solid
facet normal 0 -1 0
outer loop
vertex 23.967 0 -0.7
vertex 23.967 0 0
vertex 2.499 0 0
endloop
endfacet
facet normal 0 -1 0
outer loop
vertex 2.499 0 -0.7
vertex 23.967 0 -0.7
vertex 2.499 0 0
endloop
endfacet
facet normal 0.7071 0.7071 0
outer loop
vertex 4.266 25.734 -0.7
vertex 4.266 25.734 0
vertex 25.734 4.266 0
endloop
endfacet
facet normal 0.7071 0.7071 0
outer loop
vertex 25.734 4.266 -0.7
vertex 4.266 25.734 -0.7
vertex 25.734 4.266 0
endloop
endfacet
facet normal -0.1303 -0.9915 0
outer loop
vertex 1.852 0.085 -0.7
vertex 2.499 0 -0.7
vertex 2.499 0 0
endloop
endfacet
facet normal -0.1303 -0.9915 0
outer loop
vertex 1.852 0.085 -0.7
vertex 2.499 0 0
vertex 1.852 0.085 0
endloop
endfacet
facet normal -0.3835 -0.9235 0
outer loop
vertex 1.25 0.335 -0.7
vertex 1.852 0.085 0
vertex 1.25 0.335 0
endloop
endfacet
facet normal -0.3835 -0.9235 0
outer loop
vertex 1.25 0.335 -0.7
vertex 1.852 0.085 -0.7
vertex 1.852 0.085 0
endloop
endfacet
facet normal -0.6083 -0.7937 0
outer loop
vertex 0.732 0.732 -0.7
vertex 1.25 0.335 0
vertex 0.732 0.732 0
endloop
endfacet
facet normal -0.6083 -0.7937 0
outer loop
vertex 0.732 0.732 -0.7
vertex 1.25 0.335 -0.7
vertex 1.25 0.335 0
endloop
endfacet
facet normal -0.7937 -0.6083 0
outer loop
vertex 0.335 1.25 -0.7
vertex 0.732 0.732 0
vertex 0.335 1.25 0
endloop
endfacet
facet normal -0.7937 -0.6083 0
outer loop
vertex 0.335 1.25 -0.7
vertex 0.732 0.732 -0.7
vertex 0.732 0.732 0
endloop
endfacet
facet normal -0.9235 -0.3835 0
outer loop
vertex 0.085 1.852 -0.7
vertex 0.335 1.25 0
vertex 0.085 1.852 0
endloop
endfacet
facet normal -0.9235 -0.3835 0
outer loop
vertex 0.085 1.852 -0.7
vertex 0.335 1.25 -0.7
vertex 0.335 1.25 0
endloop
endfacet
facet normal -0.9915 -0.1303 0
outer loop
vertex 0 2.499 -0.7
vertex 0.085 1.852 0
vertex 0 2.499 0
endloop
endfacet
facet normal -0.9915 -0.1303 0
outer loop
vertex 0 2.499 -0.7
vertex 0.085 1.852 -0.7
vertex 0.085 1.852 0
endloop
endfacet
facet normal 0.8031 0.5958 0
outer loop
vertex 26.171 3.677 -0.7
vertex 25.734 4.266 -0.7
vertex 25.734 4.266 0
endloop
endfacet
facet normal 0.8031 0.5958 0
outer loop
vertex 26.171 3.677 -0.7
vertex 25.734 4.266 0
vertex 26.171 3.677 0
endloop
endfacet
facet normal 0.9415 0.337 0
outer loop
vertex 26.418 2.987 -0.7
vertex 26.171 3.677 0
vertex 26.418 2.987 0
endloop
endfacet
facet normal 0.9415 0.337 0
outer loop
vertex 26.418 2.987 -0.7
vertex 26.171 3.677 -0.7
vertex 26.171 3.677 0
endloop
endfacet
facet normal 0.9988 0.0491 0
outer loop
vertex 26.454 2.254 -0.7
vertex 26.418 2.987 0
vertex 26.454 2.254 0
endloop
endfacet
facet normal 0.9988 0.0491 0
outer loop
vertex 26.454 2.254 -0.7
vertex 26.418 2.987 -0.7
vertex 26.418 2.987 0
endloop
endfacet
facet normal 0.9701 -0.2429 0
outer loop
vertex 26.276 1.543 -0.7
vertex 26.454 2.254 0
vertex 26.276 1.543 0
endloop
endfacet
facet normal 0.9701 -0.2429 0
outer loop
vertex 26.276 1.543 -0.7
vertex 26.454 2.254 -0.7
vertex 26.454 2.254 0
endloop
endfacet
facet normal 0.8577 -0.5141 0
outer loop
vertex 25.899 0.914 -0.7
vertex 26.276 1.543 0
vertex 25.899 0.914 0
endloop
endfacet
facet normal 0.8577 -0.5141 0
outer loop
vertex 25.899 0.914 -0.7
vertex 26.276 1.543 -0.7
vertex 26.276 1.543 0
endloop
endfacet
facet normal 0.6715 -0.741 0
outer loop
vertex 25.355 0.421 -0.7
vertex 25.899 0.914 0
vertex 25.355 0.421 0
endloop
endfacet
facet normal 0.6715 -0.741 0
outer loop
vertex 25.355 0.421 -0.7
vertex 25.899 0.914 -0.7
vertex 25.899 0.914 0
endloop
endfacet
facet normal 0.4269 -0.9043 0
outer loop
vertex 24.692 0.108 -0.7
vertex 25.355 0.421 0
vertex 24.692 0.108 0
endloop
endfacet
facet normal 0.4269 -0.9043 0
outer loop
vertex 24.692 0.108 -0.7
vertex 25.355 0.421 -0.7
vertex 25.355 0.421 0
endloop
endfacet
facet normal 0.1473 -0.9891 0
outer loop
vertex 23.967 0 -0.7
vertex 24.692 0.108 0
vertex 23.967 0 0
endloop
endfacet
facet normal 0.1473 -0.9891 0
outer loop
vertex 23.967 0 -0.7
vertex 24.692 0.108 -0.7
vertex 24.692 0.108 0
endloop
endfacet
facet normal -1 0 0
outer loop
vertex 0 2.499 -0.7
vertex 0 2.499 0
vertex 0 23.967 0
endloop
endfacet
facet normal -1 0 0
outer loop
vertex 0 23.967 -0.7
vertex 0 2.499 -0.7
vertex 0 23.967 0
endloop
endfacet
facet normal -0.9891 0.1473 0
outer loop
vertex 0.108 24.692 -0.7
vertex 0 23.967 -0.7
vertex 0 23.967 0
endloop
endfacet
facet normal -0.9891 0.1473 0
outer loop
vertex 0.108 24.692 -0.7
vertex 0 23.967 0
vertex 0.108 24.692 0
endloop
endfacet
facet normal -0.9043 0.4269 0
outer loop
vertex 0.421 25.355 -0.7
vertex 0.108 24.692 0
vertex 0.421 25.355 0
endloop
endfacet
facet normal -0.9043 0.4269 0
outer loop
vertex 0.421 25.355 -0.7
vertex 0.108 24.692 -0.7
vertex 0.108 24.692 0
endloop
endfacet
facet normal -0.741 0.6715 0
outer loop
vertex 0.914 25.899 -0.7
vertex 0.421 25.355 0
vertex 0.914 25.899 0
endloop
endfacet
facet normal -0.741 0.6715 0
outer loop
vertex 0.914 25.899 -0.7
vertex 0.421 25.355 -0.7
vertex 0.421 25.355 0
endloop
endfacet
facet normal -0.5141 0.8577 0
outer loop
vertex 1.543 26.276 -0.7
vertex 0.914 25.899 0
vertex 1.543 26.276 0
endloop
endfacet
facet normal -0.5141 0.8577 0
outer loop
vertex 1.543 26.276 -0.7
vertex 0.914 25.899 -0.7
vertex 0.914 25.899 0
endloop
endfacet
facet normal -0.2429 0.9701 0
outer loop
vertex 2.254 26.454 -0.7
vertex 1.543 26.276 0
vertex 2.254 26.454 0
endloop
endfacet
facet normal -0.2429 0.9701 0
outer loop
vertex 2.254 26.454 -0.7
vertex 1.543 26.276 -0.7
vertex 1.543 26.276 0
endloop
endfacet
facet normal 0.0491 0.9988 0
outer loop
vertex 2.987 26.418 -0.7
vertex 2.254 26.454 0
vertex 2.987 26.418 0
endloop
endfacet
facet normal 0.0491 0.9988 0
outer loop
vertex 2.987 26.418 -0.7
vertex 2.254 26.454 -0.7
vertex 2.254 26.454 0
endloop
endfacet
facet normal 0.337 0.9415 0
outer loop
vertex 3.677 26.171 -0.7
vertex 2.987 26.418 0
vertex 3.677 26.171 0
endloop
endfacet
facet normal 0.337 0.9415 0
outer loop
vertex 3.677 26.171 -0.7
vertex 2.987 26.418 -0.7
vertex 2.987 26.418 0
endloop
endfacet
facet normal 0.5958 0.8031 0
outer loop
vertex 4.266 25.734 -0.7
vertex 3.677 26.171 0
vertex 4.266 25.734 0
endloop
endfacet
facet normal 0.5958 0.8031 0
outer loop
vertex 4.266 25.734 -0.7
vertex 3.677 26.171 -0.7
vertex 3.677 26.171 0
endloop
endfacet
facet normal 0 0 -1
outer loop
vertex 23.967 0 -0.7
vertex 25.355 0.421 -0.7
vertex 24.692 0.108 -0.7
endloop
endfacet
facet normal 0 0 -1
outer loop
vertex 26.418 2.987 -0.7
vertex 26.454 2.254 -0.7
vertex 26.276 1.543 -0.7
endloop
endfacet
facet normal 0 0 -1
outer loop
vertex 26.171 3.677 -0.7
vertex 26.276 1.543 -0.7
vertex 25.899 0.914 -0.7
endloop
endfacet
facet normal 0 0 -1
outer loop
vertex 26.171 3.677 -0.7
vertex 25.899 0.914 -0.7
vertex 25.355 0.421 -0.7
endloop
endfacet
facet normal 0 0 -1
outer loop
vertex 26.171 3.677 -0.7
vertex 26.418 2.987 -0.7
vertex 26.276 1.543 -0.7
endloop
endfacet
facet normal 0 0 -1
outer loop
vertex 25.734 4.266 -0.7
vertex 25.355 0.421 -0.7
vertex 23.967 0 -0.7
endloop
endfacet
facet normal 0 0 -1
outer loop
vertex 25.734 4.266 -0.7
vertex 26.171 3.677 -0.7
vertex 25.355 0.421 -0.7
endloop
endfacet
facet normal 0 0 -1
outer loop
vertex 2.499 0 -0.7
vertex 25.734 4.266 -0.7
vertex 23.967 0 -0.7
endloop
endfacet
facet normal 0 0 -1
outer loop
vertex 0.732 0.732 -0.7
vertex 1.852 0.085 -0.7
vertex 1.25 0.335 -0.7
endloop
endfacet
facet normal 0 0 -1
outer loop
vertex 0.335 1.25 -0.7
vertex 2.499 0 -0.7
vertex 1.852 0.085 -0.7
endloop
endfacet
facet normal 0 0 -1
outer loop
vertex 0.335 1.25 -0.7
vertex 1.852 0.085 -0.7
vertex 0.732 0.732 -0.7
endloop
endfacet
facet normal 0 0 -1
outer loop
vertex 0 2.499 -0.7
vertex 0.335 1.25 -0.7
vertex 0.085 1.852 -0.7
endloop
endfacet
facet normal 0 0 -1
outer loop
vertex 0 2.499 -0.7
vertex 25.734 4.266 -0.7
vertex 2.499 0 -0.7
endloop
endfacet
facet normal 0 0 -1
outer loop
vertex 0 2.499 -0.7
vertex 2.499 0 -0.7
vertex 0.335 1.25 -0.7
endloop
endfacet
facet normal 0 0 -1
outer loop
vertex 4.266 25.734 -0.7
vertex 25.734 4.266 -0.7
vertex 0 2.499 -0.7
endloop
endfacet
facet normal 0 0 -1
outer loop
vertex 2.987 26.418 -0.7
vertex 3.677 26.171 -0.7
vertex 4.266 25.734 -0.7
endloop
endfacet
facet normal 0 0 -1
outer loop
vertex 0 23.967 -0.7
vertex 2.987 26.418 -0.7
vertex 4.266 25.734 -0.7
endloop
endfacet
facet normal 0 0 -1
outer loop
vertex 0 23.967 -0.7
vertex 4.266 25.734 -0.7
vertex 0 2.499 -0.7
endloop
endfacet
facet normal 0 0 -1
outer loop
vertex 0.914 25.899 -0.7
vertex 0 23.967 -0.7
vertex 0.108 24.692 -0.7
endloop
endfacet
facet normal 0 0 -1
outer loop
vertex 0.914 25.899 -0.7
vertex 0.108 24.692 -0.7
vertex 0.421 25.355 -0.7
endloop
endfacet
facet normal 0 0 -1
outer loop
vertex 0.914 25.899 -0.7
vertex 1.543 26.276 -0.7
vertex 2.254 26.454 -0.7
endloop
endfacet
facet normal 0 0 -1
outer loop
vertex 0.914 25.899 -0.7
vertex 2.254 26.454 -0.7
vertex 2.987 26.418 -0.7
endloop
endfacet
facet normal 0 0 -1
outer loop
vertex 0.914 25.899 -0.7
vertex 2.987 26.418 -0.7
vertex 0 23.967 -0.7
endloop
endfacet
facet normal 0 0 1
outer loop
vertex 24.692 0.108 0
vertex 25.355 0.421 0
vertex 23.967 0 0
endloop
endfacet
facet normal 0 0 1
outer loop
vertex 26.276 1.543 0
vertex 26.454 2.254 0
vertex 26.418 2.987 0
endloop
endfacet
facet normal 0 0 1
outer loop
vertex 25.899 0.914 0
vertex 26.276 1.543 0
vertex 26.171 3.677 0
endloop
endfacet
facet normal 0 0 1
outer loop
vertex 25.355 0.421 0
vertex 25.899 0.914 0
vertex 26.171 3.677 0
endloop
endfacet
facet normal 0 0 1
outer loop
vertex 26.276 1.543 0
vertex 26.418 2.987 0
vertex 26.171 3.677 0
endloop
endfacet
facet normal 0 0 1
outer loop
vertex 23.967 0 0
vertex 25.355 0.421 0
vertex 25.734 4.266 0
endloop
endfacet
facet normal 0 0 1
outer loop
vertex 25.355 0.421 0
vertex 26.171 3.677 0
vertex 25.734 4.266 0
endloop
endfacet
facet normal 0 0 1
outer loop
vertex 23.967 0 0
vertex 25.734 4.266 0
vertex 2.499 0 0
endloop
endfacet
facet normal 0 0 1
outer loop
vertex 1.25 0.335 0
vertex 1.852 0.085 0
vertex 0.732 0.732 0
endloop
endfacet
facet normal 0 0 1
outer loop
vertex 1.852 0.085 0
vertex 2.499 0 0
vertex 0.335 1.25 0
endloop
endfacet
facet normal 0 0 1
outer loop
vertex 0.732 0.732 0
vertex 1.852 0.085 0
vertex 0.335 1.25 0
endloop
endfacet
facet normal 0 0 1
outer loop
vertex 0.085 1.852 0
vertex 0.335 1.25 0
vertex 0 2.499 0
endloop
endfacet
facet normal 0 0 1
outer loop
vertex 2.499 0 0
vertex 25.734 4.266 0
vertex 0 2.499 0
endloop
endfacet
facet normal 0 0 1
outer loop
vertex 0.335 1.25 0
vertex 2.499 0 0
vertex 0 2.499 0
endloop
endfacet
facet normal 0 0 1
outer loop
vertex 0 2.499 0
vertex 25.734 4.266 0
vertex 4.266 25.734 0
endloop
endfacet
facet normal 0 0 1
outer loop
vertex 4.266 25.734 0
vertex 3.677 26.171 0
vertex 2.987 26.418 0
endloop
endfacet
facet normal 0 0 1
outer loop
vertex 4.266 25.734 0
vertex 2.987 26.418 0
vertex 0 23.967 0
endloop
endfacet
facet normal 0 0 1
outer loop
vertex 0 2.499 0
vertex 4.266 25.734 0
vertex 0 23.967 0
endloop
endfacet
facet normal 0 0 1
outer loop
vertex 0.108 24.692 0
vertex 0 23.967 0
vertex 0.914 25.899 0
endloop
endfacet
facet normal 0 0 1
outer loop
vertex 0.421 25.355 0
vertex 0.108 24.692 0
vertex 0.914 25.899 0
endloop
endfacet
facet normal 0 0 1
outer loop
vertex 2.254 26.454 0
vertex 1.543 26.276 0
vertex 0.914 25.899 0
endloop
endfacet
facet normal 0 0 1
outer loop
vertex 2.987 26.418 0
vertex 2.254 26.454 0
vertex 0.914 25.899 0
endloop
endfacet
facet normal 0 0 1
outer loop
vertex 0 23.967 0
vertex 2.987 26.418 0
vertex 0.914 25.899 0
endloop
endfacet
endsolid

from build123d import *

# Parameters (mm, degrees)
BASE_FLANGE1_DEPTH  = 0.7
BREAK_CORNER1_START = -0.7
BREAK_CORNER1_DEPTH = 0.7


# Read off the part's stored shape, not the designer's step: Break-Corner1
# Sheet-metal steps are written as plain solids
with BuildPart() as part:
    # Sketch1 → Base-Flange1 (new body)
    with BuildSketch(Plane.XY):
        Polygon((0, 0), (0, 30), (30, 0), align=None)
    extrude(amount=-BASE_FLANGE1_DEPTH)

    # Break-Corner1 outline → Break-Corner1 (cut)
    with BuildSketch(Plane.XY.offset(BREAK_CORNER1_START)):
        with BuildLine():
            ThreePointArc((2.499, 0), (0.731940154, 0.731940154), (0, 2.499))
            Line((0, 2.499), (0, 0))
            Line((0, 0), (2.499, 0))
        make_face()
        with BuildLine():
            Line((0, 30), (0, 23.966880308))
            ThreePointArc((0, 23.966880308), (1.542674103, 26.275655259), (4.266059846, 25.733940154))
            Line((4.266059846, 25.733940154), (0, 30))
        make_face()
        with BuildLine():
            ThreePointArc((25.733940154, 4.266059846), (26.275655259, 1.542674103), (23.966880308, 0))
            Line((23.966880308, 0), (30, 0))
            Line((30, 0), (25.733940154, 4.266059846))
        make_face()
    extrude(amount=BREAK_CORNER1_DEPTH, mode=Mode.SUBTRACT)


solid = part.part
